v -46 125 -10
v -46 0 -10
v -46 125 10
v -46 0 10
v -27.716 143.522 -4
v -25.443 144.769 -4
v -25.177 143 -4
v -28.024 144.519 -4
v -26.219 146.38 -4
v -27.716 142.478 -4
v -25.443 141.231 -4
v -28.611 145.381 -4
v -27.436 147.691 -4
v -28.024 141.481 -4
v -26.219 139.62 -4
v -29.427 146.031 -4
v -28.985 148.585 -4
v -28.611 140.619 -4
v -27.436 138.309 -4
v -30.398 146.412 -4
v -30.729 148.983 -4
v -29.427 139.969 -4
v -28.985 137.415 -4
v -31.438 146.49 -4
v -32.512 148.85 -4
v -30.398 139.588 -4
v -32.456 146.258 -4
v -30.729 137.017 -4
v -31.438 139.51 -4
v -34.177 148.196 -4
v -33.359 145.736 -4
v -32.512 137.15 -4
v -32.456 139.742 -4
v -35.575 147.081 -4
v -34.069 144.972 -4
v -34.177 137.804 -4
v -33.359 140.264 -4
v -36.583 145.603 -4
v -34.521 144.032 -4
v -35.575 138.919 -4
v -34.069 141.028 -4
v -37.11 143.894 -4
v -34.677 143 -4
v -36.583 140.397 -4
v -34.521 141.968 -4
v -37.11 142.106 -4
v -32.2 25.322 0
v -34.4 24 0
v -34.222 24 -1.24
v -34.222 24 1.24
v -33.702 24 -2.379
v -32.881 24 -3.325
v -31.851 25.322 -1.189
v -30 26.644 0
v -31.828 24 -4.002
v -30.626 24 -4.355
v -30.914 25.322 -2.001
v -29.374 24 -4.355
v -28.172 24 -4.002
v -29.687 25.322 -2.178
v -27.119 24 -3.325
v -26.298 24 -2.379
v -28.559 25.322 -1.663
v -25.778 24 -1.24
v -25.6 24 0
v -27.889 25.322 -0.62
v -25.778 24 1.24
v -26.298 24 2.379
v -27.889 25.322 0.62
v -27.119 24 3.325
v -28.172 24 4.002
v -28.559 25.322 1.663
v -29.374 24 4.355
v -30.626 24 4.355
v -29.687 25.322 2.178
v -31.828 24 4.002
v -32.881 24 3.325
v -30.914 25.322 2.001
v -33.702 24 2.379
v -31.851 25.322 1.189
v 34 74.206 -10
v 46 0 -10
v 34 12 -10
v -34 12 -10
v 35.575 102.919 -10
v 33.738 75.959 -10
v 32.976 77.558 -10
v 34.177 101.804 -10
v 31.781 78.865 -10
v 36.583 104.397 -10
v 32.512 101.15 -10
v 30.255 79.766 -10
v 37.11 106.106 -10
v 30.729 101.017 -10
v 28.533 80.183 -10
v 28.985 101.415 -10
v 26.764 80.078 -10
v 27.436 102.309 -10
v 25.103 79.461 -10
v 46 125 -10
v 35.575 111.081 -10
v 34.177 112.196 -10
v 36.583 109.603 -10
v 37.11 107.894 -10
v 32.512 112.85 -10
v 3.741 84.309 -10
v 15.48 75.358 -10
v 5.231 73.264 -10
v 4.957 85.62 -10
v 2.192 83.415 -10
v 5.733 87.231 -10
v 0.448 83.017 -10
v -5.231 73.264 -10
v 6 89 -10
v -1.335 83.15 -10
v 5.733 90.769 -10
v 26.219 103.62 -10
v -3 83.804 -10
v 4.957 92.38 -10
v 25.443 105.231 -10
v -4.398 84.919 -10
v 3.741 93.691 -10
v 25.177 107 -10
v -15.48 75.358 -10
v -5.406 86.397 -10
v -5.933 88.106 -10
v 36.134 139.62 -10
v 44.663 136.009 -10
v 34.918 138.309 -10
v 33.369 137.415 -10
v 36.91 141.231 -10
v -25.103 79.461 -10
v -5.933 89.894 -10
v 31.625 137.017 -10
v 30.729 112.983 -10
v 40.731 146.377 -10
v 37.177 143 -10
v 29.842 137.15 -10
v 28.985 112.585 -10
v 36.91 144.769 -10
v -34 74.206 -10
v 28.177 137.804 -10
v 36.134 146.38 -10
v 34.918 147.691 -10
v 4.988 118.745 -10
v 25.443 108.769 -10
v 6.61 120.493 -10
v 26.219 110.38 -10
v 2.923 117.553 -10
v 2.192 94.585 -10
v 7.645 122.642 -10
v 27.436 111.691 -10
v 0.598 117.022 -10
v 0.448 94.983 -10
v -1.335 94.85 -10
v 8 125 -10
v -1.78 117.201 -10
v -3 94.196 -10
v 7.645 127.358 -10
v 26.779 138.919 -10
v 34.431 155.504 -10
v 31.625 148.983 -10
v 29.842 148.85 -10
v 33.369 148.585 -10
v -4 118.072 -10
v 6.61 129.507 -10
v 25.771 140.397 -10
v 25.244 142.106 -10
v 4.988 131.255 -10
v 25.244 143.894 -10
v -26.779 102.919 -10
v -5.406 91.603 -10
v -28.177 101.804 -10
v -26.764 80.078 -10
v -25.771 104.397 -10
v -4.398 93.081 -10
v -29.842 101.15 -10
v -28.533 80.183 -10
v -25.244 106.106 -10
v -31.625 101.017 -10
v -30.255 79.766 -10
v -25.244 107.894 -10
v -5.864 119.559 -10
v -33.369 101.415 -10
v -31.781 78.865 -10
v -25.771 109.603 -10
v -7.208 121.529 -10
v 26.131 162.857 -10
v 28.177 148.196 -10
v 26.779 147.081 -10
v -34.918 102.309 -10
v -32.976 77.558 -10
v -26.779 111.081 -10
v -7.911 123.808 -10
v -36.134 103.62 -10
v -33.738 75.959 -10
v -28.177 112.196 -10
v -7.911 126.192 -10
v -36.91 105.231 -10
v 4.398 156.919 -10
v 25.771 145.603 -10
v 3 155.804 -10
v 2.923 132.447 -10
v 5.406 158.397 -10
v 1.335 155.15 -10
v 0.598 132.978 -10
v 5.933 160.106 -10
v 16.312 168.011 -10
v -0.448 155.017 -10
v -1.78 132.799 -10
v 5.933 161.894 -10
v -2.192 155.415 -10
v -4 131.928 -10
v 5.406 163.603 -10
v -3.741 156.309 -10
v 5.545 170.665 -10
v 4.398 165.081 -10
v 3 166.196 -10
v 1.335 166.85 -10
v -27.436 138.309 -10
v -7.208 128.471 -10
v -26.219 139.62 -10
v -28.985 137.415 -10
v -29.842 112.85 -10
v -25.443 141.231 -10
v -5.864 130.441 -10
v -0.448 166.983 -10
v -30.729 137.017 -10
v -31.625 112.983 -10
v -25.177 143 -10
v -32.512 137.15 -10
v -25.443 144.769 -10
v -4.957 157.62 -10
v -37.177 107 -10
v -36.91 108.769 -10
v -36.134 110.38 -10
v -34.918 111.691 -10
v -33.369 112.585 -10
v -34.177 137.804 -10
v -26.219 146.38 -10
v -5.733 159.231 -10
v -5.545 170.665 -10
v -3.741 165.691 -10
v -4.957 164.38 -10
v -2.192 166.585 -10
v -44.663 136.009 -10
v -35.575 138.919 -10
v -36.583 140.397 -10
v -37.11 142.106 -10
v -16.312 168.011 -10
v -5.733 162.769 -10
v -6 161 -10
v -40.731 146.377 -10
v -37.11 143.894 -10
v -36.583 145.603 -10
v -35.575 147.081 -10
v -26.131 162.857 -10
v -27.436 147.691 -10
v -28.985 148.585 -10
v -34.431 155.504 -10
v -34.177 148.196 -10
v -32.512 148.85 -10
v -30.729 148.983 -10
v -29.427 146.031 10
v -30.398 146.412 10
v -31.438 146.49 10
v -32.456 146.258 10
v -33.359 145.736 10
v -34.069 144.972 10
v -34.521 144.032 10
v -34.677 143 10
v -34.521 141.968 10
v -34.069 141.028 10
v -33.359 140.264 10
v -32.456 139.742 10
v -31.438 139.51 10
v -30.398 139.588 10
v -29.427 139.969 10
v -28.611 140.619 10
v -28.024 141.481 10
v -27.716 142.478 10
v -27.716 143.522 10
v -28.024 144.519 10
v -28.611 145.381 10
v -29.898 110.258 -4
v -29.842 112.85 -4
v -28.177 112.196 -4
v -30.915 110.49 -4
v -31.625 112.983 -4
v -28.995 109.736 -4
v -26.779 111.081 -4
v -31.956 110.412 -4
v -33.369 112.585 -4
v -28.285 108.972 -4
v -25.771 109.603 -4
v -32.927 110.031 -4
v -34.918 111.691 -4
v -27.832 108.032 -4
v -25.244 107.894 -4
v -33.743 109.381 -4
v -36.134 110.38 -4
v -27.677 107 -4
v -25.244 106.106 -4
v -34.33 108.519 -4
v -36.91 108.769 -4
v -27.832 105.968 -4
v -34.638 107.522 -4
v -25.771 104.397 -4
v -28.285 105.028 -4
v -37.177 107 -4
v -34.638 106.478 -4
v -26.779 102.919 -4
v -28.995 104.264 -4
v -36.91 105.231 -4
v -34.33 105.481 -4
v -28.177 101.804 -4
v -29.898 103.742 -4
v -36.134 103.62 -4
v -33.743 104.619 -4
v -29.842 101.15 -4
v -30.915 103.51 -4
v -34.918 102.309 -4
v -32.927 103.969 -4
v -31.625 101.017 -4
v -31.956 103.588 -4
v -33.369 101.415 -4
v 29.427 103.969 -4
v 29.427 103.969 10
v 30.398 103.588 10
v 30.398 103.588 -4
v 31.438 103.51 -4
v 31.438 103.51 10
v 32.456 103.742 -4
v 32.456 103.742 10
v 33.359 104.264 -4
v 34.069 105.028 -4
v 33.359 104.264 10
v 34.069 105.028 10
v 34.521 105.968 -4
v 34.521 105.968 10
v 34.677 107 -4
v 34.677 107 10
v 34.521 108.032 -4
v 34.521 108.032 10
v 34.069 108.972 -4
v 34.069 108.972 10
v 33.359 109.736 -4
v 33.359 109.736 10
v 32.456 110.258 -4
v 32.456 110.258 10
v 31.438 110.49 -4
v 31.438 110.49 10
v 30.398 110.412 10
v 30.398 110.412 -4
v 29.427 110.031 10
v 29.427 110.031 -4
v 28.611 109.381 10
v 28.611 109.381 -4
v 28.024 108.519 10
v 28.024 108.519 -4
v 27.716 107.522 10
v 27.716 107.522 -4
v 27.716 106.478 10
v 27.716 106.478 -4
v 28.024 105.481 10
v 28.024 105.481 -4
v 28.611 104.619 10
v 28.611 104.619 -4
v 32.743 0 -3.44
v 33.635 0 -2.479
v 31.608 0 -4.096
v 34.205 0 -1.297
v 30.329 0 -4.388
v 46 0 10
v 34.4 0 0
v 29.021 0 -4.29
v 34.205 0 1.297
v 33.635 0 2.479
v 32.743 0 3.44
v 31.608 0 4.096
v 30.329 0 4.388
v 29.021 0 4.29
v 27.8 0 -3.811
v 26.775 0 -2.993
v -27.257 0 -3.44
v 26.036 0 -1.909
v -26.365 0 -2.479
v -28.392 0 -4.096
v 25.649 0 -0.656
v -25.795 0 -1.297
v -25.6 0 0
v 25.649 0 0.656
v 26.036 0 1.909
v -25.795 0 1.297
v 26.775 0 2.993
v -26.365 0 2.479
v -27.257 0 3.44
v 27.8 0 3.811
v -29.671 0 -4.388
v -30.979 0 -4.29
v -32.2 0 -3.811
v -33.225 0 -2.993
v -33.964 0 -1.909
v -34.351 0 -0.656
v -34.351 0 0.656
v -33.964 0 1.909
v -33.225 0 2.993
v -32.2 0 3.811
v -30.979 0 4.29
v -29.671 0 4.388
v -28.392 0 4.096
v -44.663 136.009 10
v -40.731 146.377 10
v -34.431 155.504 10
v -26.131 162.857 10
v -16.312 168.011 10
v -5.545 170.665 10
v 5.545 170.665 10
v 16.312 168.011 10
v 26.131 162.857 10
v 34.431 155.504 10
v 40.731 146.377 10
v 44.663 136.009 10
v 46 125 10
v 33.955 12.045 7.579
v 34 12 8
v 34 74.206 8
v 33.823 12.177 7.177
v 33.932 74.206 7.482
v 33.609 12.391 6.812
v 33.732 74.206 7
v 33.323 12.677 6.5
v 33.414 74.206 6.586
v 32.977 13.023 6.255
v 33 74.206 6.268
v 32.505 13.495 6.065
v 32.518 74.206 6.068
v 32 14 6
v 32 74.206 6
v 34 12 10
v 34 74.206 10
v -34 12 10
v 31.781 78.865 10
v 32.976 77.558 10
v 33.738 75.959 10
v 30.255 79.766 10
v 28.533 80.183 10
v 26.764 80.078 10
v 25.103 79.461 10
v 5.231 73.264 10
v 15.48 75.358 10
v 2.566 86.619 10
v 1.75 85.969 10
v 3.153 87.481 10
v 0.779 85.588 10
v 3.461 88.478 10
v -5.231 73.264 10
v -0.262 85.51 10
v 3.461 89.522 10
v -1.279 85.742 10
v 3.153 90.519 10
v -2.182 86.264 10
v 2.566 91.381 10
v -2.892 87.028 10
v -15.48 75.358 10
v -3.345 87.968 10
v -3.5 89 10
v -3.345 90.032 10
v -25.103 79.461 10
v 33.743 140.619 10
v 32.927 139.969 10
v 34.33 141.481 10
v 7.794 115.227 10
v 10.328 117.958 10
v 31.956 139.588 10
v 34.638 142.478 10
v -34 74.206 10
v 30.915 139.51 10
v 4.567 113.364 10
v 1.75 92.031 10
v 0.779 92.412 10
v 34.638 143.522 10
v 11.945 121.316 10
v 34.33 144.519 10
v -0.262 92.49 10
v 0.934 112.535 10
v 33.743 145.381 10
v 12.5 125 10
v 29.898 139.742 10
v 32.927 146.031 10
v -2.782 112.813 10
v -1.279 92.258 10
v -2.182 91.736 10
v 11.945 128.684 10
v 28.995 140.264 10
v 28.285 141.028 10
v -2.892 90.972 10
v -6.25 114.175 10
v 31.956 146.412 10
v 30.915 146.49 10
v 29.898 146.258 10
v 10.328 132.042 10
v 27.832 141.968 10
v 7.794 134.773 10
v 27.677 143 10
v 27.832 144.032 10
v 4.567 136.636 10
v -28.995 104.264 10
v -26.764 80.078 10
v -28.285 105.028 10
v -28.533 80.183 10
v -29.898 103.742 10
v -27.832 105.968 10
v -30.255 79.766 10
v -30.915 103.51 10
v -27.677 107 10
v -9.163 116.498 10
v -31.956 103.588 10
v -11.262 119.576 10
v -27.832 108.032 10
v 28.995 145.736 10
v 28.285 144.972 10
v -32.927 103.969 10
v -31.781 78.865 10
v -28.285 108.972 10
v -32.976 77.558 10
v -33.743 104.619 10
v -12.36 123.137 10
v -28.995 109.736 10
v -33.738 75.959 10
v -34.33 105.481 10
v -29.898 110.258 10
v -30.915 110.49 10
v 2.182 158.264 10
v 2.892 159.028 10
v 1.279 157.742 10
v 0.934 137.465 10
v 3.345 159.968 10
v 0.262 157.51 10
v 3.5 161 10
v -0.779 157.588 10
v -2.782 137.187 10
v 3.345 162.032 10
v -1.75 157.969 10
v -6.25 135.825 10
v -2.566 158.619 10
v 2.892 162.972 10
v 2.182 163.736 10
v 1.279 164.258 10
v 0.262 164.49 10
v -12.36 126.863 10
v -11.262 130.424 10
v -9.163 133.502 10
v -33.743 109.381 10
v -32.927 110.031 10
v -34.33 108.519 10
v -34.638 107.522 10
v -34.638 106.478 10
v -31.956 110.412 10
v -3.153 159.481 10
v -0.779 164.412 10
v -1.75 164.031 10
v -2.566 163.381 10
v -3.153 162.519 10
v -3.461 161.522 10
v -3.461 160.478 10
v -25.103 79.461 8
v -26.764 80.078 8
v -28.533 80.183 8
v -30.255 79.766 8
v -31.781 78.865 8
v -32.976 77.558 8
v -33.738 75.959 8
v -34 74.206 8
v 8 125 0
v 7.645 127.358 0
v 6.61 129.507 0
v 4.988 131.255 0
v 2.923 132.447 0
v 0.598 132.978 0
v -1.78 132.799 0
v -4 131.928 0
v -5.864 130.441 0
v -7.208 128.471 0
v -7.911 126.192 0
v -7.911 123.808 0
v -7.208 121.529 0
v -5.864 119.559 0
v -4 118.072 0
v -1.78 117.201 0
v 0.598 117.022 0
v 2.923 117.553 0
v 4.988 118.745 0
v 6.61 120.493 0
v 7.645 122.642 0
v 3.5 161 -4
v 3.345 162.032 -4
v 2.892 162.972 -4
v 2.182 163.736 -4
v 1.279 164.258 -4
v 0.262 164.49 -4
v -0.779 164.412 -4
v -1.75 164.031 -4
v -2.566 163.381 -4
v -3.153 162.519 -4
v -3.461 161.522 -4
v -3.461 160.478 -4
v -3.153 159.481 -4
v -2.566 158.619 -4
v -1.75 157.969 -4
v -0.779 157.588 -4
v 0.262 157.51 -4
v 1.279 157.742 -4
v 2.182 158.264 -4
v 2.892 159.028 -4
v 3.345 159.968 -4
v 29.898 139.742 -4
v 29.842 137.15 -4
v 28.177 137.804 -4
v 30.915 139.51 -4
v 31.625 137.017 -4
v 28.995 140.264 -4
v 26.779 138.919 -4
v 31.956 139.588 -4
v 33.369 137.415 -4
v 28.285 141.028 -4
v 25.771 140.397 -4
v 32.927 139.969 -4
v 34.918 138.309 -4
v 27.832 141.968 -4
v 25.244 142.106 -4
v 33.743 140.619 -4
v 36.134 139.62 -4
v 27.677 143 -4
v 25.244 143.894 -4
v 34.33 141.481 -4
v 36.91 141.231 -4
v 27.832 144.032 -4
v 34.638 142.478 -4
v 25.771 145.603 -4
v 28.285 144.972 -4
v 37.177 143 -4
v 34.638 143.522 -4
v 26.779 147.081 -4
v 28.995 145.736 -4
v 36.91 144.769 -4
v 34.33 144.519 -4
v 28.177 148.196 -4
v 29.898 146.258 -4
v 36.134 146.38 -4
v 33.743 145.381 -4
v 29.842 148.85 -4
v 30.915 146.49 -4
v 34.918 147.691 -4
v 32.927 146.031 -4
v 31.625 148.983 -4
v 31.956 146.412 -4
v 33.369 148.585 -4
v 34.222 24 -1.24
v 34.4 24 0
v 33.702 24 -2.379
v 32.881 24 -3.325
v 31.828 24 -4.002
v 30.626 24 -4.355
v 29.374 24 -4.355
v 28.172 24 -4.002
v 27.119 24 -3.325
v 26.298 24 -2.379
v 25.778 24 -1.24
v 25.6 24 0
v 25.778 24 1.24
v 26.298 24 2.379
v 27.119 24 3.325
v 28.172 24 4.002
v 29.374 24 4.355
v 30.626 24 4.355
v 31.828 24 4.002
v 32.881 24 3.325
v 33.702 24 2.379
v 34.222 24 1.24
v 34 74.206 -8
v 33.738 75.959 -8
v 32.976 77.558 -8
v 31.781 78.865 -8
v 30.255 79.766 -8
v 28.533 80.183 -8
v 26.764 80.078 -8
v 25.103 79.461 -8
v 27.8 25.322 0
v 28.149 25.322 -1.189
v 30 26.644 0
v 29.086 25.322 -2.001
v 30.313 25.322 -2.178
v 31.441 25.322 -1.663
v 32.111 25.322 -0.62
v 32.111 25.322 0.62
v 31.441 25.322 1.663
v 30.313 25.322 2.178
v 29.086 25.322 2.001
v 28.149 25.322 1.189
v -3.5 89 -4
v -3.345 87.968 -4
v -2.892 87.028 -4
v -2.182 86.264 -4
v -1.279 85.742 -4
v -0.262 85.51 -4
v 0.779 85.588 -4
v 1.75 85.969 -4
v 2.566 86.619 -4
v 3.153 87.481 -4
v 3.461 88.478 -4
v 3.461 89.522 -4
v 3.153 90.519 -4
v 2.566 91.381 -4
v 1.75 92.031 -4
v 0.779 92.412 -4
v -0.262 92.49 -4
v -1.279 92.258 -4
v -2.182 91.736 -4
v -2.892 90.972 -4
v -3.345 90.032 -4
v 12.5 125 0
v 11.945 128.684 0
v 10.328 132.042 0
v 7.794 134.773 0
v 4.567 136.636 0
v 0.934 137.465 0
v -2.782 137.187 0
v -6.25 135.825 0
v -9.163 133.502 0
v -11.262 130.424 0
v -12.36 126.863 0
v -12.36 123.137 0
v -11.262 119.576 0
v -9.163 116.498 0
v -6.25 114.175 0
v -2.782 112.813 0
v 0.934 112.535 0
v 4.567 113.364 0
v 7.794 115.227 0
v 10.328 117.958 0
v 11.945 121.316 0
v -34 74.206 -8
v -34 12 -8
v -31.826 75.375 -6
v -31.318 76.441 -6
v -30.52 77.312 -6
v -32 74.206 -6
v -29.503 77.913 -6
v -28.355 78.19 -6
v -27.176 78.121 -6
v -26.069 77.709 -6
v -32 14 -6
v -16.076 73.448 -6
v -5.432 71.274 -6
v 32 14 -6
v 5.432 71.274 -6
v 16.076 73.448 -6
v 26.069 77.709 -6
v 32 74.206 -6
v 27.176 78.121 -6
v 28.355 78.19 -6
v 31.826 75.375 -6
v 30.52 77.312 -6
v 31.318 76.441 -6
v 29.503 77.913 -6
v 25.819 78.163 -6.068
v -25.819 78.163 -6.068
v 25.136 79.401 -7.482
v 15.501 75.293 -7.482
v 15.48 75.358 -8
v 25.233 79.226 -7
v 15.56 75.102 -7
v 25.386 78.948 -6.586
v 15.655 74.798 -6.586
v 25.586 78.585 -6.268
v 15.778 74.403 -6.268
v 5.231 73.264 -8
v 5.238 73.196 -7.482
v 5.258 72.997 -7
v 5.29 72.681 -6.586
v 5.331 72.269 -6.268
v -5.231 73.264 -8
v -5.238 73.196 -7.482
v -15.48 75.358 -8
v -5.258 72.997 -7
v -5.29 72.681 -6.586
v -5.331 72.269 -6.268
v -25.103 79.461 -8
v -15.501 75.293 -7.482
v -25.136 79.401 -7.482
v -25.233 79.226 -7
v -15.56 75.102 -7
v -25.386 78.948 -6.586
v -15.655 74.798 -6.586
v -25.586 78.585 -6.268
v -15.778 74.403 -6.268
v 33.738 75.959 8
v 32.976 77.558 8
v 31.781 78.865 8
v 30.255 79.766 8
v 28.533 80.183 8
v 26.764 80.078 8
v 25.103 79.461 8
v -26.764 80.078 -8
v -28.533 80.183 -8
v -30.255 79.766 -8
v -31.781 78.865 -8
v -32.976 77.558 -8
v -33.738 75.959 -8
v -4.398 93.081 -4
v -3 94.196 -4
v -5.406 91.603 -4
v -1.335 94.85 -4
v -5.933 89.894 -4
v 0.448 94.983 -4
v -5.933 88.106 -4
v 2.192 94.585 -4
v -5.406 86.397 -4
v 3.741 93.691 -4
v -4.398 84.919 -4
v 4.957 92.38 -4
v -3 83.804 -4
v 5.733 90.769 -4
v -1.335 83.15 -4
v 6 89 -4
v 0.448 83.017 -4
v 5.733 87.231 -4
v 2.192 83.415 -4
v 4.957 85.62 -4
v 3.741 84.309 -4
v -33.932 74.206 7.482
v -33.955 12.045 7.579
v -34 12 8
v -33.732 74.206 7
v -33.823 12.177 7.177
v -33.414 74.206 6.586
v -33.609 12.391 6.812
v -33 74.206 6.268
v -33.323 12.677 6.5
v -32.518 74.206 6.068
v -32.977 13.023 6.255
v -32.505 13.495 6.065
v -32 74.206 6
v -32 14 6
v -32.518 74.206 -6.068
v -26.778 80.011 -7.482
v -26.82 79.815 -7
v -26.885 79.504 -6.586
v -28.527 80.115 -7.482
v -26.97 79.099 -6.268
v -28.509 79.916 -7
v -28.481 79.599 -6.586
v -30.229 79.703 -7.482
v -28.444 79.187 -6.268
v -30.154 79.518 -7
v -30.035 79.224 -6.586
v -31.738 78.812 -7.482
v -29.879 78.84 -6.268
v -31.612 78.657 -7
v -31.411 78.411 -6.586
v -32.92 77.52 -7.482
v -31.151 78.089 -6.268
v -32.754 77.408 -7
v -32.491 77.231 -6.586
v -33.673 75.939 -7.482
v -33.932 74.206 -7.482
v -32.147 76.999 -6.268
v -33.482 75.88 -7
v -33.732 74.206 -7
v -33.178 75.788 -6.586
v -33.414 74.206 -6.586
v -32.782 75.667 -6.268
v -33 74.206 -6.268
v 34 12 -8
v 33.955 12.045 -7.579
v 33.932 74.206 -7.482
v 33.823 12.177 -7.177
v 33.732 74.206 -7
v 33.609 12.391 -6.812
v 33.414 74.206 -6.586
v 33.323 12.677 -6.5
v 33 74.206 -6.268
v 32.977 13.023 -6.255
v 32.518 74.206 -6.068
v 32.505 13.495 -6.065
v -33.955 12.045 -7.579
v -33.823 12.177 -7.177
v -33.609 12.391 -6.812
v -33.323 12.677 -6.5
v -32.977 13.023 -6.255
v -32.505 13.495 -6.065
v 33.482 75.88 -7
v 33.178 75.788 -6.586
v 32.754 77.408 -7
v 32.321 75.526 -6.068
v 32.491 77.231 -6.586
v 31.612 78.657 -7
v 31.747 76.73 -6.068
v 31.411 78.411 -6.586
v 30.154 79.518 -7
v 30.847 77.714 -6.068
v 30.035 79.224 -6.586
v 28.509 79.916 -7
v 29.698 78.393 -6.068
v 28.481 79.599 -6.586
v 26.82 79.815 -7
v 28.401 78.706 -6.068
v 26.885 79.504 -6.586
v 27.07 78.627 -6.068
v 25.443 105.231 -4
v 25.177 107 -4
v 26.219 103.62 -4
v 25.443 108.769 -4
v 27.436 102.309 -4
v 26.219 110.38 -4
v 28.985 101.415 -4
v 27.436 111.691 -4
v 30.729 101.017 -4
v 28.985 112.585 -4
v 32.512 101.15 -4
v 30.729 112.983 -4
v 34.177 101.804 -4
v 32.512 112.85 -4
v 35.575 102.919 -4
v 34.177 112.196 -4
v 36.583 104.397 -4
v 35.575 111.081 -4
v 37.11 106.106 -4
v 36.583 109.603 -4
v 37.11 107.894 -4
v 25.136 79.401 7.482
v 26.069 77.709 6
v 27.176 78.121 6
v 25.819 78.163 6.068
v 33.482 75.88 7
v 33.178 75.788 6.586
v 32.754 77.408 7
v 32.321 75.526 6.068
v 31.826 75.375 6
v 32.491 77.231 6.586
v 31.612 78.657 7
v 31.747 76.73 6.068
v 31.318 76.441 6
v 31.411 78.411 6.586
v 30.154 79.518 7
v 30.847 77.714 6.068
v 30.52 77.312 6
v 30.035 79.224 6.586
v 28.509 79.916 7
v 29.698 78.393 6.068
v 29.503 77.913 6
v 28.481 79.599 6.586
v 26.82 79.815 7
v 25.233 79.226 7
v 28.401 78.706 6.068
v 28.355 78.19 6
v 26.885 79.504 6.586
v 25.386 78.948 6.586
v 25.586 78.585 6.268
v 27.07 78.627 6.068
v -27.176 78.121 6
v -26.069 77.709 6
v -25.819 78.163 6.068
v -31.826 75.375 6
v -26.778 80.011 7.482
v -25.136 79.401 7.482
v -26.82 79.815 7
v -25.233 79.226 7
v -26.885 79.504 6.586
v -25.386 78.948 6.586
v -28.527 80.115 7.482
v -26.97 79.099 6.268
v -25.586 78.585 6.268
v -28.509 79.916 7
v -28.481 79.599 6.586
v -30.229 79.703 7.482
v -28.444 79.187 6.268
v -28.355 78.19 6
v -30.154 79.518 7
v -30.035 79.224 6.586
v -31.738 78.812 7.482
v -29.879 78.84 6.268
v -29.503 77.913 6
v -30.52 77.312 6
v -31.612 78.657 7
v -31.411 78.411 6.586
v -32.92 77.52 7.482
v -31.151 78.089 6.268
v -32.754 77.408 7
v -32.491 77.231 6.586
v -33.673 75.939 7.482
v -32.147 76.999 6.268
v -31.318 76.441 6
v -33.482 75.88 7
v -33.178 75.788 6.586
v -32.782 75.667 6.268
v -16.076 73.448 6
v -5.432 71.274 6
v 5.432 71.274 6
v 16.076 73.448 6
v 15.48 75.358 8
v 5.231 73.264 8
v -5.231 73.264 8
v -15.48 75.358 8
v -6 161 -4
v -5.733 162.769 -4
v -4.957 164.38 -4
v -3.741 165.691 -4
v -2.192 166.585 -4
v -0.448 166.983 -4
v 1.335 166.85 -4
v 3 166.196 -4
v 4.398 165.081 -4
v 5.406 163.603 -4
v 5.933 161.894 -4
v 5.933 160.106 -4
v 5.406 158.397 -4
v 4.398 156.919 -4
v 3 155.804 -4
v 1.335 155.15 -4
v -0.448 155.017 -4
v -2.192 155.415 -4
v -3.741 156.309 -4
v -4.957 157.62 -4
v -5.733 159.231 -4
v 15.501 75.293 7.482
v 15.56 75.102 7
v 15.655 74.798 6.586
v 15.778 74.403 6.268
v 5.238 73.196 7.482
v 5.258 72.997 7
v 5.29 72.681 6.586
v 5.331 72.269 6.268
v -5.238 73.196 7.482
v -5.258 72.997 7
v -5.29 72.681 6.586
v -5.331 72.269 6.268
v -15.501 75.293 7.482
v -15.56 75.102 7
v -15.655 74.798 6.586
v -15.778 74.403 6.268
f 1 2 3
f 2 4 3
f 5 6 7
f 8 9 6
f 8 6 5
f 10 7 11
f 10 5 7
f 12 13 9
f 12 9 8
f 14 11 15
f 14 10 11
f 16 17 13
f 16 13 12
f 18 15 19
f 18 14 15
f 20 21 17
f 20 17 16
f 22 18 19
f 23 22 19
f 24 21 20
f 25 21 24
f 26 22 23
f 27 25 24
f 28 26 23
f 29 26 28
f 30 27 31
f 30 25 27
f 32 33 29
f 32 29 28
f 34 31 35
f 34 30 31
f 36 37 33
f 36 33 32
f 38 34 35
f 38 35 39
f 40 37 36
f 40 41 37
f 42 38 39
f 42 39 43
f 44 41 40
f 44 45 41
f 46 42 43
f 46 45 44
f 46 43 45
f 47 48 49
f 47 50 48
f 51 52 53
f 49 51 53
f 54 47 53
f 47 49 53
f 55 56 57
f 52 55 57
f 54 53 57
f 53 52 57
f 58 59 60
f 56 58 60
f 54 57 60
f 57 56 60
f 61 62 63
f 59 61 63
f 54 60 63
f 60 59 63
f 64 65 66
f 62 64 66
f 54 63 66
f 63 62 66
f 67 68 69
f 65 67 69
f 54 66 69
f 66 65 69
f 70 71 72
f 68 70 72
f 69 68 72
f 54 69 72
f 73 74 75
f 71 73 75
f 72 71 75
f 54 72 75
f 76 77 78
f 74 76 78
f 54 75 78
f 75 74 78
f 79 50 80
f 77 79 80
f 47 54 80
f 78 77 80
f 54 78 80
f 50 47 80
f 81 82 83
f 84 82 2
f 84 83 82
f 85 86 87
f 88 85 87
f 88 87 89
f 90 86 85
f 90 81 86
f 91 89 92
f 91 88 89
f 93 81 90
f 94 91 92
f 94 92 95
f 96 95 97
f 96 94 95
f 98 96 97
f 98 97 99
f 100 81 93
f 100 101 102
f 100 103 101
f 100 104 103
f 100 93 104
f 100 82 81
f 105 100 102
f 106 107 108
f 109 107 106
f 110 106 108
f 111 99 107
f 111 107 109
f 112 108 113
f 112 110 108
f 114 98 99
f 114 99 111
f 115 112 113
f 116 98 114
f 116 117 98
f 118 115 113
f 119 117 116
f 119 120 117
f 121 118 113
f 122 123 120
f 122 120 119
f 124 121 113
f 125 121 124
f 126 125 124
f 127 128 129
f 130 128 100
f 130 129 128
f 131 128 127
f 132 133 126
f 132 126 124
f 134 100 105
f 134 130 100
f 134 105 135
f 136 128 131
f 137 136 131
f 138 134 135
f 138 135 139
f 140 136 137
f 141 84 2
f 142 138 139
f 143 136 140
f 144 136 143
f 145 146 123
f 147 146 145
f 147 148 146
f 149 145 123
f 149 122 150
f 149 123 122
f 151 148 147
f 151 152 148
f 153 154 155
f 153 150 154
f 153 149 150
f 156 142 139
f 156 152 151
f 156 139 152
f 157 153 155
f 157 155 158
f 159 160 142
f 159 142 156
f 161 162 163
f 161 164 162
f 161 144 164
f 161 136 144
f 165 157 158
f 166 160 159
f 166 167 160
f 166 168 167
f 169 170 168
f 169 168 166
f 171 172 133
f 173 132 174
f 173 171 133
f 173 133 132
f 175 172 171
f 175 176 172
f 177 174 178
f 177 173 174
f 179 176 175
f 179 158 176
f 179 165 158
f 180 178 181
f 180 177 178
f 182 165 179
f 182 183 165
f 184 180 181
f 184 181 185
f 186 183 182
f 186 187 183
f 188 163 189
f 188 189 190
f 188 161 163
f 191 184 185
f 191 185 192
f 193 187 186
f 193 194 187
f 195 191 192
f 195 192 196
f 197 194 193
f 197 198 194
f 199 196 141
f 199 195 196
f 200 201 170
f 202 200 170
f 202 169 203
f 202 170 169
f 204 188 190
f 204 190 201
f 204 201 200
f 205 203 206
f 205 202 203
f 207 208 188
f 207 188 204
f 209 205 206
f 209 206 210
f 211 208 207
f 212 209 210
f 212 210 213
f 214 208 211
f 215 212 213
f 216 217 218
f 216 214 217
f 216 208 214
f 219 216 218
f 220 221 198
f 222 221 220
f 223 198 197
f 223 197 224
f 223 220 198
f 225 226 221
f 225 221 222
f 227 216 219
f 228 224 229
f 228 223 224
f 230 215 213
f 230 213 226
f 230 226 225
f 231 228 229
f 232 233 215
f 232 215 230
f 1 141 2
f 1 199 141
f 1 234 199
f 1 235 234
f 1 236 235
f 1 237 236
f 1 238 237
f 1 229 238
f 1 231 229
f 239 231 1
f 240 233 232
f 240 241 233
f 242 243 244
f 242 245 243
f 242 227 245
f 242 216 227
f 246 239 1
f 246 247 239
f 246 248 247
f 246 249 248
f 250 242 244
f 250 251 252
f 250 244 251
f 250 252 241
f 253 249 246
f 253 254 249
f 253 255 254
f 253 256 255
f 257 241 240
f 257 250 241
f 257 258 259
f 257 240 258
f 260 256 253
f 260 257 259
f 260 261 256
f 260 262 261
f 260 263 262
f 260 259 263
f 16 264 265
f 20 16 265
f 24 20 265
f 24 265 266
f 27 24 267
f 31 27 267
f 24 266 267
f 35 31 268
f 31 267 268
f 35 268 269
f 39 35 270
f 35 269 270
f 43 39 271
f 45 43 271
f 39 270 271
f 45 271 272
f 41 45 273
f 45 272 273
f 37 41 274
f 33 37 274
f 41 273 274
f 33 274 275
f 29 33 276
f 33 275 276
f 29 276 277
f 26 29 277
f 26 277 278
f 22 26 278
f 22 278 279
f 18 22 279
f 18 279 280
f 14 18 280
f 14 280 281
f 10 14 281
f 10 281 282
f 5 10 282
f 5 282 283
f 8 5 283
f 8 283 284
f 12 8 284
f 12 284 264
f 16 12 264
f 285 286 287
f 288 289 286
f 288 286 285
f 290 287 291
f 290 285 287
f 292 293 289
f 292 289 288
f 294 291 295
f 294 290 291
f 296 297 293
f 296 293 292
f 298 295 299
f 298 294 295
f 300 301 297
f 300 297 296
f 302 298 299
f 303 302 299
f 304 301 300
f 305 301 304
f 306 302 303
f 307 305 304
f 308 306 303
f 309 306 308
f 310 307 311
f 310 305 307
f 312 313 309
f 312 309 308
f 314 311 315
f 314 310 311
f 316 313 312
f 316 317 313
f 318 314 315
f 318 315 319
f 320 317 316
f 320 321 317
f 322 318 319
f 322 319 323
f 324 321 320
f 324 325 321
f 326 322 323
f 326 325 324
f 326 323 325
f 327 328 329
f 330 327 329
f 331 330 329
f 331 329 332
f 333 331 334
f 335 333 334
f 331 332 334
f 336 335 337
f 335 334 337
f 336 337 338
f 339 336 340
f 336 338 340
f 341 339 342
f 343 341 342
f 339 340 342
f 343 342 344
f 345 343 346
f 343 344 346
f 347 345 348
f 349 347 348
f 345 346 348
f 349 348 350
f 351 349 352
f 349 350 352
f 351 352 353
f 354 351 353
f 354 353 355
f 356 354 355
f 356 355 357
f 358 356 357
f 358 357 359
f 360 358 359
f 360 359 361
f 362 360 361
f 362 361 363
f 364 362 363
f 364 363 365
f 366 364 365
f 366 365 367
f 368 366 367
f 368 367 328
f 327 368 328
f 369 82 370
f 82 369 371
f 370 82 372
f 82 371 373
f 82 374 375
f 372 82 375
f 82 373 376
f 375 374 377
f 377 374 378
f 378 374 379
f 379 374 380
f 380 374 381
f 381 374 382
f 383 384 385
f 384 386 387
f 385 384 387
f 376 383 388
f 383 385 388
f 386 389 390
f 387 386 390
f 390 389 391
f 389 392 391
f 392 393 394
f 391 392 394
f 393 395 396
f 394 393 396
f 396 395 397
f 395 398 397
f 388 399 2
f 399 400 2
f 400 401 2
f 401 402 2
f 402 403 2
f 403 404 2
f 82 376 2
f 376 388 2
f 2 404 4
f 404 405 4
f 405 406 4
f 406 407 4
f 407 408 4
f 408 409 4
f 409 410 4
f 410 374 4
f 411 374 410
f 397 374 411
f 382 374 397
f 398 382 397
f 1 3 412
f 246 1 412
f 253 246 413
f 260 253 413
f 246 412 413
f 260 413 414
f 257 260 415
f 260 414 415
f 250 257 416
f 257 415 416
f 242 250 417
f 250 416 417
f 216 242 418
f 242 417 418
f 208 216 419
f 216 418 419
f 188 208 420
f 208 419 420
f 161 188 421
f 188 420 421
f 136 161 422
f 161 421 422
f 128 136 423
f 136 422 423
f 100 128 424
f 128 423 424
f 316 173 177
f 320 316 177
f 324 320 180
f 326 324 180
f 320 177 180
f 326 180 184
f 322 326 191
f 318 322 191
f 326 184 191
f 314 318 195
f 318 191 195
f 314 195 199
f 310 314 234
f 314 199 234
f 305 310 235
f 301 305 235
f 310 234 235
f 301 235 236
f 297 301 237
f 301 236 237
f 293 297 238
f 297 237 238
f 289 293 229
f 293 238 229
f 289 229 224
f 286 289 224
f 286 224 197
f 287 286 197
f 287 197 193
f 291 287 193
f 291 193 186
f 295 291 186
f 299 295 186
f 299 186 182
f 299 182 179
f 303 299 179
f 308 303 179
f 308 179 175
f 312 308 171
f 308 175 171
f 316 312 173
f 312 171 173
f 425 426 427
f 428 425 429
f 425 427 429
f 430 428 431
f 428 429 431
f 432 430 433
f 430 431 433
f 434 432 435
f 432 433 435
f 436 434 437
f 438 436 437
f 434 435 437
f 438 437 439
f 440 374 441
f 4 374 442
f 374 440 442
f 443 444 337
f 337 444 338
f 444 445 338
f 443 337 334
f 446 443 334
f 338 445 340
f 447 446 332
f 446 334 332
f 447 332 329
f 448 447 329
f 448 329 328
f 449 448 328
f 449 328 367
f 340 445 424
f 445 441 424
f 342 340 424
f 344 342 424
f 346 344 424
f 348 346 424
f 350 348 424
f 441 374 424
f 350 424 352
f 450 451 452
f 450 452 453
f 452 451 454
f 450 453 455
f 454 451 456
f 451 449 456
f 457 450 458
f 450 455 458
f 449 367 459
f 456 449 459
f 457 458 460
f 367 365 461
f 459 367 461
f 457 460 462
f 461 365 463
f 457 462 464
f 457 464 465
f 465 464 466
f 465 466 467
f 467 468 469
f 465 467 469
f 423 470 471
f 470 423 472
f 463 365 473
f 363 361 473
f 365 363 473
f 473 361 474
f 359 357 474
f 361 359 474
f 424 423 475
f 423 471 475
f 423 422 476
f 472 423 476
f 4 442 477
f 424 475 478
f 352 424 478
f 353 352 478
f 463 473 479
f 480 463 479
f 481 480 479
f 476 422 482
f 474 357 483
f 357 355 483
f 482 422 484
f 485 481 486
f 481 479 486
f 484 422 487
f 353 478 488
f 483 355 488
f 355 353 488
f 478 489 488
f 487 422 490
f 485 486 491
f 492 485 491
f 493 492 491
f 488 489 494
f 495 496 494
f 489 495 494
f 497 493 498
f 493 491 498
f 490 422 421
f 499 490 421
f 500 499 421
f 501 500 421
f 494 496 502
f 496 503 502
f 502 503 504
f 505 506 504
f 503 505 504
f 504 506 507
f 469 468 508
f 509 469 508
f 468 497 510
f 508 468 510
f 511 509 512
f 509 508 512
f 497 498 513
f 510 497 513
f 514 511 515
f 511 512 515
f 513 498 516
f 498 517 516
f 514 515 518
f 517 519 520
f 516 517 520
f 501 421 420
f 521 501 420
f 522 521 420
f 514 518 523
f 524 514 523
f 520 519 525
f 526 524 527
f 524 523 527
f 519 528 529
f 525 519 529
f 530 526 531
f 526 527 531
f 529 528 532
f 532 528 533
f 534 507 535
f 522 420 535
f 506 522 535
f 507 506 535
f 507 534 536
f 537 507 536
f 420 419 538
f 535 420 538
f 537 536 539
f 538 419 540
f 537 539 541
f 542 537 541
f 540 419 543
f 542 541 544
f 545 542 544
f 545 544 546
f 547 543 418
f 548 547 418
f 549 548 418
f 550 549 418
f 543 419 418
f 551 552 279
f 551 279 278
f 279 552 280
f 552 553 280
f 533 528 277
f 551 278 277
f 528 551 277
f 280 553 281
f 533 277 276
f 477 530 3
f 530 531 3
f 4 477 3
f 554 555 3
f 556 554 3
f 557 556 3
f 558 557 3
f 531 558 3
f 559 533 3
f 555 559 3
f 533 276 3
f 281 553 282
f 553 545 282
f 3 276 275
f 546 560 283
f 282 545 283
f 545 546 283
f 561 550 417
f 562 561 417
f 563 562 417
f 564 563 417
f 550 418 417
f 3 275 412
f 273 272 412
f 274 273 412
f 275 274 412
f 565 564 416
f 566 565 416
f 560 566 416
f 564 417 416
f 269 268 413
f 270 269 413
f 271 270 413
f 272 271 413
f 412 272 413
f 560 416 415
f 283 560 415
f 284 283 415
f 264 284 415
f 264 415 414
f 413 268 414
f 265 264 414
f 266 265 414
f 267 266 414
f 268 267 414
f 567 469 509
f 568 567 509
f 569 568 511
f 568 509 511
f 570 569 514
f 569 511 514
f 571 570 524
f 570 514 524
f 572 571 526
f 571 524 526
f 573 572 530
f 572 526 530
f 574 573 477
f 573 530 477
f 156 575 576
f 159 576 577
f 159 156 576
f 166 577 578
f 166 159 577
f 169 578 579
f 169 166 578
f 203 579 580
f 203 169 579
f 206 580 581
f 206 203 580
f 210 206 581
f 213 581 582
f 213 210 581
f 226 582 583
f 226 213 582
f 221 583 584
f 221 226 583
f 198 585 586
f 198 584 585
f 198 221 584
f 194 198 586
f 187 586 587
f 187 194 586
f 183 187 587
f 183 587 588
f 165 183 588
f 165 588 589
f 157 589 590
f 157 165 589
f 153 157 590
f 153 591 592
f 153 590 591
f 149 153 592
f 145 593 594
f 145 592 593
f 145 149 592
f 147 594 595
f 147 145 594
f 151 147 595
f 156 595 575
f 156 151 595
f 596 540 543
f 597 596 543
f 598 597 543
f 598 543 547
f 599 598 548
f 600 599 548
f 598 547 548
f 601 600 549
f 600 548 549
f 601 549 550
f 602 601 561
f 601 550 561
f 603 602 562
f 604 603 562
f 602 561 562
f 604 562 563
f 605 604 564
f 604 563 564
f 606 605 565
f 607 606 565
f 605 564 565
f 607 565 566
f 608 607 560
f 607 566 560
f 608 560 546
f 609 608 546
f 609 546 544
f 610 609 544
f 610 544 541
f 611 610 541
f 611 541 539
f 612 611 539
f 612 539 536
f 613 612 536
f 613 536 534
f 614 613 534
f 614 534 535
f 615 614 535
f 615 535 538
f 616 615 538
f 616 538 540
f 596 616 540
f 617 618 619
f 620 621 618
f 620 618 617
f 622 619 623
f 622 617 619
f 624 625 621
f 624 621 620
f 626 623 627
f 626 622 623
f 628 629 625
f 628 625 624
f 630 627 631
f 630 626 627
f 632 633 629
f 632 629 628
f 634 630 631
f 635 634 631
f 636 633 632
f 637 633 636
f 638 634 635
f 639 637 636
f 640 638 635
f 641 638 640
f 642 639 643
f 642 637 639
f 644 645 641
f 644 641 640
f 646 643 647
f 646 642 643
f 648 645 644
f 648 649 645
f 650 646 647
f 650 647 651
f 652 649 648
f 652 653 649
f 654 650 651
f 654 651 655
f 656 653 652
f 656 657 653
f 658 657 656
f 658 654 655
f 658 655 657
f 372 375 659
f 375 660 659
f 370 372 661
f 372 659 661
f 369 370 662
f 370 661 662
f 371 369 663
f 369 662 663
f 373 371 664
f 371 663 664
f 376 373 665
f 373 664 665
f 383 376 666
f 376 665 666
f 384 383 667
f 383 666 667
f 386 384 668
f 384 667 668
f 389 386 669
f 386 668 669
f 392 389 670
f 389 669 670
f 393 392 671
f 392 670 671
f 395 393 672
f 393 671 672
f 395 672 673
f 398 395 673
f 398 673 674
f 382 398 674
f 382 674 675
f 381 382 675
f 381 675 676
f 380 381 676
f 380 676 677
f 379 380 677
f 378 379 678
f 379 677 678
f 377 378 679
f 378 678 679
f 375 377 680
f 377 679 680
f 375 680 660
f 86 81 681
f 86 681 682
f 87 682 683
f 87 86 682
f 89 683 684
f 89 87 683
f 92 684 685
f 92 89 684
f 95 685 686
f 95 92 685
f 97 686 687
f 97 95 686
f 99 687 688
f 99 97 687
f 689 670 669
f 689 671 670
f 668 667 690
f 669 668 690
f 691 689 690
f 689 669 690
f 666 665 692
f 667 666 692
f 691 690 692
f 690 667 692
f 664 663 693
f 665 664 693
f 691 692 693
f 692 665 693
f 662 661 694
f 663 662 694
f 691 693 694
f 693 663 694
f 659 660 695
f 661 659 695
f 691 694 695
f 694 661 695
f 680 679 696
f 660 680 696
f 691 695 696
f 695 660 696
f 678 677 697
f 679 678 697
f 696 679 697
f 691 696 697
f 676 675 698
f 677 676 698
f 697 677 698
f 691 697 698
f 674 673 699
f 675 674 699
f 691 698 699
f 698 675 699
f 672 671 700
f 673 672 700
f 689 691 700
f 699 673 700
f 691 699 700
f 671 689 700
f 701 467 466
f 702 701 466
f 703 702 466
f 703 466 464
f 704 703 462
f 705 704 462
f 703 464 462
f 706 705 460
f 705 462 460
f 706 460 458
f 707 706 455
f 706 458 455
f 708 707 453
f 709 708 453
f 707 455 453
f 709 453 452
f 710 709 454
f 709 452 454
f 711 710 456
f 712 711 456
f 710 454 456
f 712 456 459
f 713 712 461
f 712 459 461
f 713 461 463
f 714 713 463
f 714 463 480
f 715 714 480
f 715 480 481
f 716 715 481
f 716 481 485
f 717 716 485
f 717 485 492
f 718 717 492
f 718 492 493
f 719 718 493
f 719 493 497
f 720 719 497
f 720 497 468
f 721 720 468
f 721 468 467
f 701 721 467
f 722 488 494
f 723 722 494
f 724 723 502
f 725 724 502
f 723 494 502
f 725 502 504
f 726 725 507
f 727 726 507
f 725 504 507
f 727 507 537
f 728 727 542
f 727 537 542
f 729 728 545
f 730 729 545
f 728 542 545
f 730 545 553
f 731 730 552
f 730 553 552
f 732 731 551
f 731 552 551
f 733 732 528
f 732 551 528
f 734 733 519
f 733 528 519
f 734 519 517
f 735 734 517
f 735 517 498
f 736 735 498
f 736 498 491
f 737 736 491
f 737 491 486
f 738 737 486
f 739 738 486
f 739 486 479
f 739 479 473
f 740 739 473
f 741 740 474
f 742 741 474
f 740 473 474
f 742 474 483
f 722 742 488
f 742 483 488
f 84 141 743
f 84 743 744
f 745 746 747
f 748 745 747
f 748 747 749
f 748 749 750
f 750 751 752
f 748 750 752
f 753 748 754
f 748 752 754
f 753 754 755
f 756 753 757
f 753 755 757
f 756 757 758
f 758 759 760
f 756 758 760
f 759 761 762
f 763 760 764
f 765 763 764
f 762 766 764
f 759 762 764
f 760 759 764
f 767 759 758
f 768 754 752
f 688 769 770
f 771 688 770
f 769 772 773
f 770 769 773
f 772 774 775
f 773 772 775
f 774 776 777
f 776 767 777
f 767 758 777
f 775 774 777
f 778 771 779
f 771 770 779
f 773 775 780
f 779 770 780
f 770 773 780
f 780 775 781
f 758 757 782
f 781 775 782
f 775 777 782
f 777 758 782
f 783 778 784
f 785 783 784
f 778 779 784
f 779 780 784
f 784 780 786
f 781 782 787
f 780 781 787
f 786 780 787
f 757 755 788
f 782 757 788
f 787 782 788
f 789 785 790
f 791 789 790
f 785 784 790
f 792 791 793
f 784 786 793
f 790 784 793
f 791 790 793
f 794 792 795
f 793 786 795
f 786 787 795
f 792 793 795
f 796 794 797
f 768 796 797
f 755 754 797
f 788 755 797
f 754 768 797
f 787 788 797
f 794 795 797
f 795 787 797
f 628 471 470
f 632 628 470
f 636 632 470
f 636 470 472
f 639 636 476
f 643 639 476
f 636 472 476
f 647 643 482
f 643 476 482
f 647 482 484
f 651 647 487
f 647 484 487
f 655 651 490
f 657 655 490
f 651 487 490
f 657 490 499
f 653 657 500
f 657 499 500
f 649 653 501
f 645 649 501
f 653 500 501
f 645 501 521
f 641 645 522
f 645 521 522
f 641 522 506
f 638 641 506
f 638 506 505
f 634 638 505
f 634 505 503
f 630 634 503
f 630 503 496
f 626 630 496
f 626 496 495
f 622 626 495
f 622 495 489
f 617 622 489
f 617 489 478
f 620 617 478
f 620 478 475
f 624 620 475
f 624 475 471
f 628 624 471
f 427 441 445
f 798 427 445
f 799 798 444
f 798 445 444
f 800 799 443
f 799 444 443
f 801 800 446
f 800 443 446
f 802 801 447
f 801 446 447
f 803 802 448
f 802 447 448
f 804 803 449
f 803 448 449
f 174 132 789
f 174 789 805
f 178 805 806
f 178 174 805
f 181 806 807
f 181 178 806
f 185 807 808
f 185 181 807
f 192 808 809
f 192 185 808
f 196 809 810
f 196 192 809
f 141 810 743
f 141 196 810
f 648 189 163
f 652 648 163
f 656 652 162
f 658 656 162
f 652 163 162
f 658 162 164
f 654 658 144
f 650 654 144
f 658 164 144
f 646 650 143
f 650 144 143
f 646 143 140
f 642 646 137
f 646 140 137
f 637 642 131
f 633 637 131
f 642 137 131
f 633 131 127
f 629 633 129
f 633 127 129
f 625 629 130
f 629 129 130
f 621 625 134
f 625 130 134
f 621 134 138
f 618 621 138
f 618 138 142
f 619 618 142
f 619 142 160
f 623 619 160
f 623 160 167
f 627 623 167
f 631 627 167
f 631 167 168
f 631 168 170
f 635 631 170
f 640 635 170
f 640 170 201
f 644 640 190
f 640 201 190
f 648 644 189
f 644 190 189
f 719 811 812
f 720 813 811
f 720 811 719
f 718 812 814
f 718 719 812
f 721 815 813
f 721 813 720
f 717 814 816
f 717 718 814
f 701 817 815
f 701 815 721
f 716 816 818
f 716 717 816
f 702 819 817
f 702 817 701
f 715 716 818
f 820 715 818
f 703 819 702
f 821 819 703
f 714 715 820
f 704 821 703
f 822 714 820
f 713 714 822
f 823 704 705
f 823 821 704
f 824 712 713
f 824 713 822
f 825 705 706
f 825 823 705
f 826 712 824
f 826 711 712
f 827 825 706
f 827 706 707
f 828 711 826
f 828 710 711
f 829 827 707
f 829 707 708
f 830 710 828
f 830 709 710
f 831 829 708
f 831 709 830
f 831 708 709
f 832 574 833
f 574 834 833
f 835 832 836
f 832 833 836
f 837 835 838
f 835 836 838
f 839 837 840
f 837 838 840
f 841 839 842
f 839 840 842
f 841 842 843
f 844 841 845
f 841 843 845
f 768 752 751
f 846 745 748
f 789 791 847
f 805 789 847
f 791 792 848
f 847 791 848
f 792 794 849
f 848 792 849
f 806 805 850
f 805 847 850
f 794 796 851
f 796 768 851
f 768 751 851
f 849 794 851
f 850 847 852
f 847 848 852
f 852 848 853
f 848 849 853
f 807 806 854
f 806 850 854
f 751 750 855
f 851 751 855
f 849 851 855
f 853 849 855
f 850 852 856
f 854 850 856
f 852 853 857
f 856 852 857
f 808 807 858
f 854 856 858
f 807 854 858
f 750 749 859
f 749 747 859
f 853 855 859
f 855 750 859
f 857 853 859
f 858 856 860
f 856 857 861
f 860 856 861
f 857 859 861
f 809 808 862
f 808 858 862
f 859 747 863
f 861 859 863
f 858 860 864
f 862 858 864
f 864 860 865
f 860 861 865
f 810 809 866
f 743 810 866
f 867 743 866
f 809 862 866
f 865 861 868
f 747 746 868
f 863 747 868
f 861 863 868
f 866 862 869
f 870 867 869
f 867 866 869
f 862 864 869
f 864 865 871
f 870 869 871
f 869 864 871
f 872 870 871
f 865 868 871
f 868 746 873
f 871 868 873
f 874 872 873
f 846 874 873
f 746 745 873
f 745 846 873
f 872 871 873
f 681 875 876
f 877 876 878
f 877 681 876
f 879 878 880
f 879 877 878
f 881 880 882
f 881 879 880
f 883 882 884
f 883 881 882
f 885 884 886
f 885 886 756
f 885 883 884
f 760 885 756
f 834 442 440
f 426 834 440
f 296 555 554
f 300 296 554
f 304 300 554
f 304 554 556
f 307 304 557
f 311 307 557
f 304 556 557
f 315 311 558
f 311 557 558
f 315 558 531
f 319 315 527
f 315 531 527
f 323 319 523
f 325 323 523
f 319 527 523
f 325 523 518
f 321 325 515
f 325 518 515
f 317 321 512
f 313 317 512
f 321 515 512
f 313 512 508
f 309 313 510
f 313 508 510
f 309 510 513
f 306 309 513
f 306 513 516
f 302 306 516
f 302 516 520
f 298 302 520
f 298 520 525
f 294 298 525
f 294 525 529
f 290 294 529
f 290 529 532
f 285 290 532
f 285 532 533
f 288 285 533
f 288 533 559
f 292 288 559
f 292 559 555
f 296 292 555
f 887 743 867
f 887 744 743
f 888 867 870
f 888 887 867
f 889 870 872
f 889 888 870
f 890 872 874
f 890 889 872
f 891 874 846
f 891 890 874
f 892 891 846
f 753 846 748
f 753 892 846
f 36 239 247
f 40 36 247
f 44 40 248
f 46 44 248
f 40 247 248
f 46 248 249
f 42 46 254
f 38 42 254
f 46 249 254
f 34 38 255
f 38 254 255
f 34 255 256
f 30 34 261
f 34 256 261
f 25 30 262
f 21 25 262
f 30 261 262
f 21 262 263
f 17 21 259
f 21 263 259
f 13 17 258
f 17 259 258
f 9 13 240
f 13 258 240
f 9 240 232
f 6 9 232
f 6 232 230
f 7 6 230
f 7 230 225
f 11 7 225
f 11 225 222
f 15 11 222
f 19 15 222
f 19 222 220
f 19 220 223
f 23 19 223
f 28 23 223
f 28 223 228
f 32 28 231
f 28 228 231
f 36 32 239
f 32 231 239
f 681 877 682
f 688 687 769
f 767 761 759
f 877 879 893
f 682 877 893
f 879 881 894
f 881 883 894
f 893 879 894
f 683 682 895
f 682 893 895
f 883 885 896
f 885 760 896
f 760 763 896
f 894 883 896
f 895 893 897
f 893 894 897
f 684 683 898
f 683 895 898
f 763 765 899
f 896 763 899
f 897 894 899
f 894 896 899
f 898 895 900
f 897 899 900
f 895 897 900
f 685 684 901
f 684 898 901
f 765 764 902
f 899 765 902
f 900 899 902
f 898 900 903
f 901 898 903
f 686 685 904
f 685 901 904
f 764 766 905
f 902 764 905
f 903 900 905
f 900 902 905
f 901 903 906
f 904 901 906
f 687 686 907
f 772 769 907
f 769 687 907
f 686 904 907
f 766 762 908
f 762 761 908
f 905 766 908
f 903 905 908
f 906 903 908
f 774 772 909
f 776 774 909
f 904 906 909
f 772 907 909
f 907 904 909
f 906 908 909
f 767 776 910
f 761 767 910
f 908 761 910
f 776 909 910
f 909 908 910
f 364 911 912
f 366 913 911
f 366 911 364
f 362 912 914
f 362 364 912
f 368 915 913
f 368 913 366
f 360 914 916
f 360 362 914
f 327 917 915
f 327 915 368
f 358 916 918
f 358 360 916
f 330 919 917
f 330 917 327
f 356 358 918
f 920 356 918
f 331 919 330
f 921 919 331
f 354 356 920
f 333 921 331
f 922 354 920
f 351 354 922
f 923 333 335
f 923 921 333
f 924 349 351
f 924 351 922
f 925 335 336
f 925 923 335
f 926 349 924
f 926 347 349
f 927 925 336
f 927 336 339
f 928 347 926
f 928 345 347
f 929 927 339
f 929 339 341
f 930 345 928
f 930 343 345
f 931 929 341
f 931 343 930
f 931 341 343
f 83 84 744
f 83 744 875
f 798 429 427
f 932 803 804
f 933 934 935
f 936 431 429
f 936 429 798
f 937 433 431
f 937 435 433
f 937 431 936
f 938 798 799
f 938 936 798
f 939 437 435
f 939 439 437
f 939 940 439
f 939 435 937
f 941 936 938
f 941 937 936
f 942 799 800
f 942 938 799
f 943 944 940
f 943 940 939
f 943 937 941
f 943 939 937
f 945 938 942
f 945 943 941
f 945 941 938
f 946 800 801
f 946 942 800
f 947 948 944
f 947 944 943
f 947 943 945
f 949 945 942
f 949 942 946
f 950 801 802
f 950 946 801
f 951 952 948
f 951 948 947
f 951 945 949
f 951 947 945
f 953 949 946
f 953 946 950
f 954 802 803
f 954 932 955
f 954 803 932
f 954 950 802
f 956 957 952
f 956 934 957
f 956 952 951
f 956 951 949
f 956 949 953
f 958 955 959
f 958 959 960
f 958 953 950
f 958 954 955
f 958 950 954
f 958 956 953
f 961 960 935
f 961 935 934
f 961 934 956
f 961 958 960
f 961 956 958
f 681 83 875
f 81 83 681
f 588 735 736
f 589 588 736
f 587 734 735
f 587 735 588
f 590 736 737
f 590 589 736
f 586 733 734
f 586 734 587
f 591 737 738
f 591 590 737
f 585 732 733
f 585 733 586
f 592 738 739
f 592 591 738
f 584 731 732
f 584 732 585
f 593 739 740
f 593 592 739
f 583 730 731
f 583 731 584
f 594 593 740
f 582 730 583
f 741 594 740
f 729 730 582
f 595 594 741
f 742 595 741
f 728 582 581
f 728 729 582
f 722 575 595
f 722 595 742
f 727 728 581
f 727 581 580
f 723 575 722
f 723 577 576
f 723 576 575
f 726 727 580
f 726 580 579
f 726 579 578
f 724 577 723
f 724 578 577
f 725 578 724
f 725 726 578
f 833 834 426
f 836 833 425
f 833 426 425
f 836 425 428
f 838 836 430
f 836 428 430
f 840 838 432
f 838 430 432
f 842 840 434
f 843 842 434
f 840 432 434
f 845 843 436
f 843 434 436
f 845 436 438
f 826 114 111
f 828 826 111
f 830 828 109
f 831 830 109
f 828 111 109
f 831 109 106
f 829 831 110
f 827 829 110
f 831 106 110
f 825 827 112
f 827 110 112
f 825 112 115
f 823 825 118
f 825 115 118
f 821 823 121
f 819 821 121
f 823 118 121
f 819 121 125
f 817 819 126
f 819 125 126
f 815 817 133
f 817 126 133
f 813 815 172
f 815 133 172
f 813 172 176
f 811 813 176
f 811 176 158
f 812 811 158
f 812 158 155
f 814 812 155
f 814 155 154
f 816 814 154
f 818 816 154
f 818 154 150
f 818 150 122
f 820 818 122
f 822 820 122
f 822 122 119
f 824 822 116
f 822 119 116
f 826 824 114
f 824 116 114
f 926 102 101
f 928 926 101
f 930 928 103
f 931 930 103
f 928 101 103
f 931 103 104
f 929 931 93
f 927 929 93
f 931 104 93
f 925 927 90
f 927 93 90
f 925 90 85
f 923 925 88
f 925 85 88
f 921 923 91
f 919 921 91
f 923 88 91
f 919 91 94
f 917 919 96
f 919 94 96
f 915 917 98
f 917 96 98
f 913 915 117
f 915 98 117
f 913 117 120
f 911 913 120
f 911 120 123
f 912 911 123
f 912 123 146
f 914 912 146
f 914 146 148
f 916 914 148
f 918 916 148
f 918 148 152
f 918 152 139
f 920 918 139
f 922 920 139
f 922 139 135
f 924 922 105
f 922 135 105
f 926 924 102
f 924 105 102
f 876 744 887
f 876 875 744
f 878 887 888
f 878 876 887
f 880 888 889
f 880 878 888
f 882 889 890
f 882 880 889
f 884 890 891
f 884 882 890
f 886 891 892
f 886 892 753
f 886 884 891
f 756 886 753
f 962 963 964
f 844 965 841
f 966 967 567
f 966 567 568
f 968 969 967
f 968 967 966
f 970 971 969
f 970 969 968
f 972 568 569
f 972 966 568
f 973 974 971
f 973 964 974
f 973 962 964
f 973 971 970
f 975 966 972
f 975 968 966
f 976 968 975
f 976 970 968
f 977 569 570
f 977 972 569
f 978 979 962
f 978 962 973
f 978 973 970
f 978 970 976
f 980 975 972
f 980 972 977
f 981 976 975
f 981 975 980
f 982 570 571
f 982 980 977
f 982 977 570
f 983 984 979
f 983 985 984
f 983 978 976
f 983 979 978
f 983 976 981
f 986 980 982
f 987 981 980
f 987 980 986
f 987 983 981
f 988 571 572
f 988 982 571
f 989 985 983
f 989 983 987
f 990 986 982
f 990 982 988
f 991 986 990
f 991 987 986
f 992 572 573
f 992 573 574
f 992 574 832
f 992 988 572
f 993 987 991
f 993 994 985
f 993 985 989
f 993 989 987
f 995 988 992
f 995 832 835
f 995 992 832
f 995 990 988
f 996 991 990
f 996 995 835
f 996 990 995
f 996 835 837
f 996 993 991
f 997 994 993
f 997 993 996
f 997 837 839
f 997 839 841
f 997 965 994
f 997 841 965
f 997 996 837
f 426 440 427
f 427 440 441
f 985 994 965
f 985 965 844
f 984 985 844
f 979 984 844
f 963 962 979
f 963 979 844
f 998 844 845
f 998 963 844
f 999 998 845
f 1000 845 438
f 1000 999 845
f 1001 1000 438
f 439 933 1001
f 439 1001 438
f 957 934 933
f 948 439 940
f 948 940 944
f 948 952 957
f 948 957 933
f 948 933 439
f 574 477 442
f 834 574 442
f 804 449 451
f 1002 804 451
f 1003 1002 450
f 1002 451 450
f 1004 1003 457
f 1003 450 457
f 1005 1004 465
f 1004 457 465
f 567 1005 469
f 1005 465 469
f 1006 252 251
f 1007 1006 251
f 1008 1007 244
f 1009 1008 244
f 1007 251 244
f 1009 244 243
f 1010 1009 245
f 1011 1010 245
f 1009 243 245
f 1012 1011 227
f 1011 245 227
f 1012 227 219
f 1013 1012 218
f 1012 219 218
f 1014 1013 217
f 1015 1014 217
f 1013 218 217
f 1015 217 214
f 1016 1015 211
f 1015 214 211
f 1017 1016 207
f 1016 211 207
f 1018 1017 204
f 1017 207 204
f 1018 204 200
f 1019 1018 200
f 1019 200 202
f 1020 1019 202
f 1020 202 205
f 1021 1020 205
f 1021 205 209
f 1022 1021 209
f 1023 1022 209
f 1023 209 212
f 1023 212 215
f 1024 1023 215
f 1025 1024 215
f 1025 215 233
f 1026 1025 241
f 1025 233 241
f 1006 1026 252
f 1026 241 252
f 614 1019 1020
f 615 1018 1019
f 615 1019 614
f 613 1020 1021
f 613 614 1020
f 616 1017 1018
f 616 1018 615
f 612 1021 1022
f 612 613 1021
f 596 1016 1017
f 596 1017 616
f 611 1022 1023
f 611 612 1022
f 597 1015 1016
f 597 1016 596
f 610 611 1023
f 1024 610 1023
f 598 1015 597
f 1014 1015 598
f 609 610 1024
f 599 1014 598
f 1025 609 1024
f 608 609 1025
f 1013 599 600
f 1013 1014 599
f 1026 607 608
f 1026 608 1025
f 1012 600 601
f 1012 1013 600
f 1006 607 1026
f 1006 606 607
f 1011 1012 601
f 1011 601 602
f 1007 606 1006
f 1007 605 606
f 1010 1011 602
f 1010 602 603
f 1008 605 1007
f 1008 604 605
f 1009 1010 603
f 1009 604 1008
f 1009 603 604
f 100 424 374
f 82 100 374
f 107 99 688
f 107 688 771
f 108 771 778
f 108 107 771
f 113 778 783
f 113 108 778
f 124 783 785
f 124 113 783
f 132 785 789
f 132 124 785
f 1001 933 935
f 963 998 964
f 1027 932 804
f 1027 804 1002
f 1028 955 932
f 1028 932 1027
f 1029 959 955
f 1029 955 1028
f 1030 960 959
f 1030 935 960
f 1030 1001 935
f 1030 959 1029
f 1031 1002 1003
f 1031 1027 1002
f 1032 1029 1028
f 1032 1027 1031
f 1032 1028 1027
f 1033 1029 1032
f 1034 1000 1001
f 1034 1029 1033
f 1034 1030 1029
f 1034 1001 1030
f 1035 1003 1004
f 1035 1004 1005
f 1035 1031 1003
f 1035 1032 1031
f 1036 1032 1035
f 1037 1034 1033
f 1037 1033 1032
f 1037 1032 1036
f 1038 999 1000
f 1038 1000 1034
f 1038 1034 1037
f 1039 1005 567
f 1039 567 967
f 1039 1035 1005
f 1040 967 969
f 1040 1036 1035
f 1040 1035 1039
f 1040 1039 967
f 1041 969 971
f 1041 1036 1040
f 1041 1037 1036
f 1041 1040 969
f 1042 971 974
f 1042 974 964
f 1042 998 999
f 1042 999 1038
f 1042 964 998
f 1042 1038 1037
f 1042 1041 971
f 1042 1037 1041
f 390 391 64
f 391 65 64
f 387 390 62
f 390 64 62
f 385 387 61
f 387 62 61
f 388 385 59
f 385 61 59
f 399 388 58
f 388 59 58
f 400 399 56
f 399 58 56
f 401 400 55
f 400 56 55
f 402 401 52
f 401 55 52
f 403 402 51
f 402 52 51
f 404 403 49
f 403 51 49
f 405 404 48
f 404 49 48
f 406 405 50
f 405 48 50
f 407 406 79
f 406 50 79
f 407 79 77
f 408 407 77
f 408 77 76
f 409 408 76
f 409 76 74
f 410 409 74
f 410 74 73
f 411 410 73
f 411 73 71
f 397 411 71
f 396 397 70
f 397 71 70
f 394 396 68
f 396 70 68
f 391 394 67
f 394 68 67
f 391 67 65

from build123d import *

# Parameters (mm, degrees)
SKETCH1_R                         = 8
BOSS_EXTRUDE1_DEPTH               = 10
SKETCH2_R                         = 12.5
CUT_EXTRUDE1_DEPTH                = 10
SKETCH3_R                         = 3.5
CUT_EXTRUDE2_DEPTH                = 21
SKETCH4_R                         = 6
CUT_EXTRUDE3_DEPTH                = 6
CIRPATTERN1_COUNT                 = 6
TAP_DRILL_FOR_M10X1_25_TAP2_D     = 8.8
TAP_DRILL_FOR_M10X1_25_TAP2_DEPTH = 24
TAP_DRILL_FOR_M10X1_25_TAP2_TIP   = 2.643786724
CUT_EXTRUDE4_DEPTH                = 4
FILLET1_R                         = 2
FILLET1_OF_MIRROR1_R              = 2


with BuildPart() as part:
    # Sketch1 → Boss-Extrude1 (new body, symmetric)
    with BuildSketch(Plane.XY):
        with BuildLine():
            Line((46, 125), (46, 0))
            Line((46, 0), (-46, 0))
            Line((-46, 0), (-46, 125))
            ThreePointArc((-46, 125), (0, 171), (46, 125))
        make_face()
        with Locations((0, 125)):
            Circle(SKETCH1_R, mode=Mode.SUBTRACT)
    extrude(amount=BOSS_EXTRUDE1_DEPTH, both=True)

    # Sketch2 → Cut-Extrude1 (cut)
    with BuildSketch(Plane.XY.offset(10)):
        with Locations((0, 125)):
            Circle(SKETCH2_R)
    extrude(amount=-CUT_EXTRUDE1_DEPTH, mode=Mode.SUBTRACT)

    # Sketch3 → Cut-Extrude2 (cut, through all)
    with BuildSketch(Plane.XY.offset(10)):
        with Locations((0, 161)):
            Circle(SKETCH3_R)
    cut_extrude2 = extrude(amount=-CUT_EXTRUDE2_DEPTH, mode=Mode.SUBTRACT)

    # Sketch4 → Cut-Extrude3 (cut)
    with BuildSketch(Plane(origin=(0, 0, -10), x_dir=(-1, 0, 0), z_dir=(0, 0, -1))):
        with Locations((0, 161)):
            Circle(SKETCH4_R)
    cut_extrude3 = extrude(amount=-CUT_EXTRUDE3_DEPTH, mode=Mode.SUBTRACT)

    # CirPattern1: Cut-Extrude2, Cut-Extrude3 ×6 about axis
    cirpattern1_axis = Axis((0, 125, 0), (0, 0, 1))
    for i in range(1, CIRPATTERN1_COUNT):
        add(cut_extrude2.rotate(cirpattern1_axis, i * 360 / CIRPATTERN1_COUNT), mode=Mode.SUBTRACT)
        add(cut_extrude3.rotate(cirpattern1_axis, i * 360 / CIRPATTERN1_COUNT), mode=Mode.SUBTRACT)

    # Tap Drill for M10x1.25 Tap2
    with Locations(Plane(origin=(0, 0, 0), x_dir=(-1, 0, 0), z_dir=(0, -1, 0))):
        with Locations((30, 0), (-30, 0)):
            Hole(TAP_DRILL_FOR_M10X1_25_TAP2_D / 2, depth=TAP_DRILL_FOR_M10X1_25_TAP2_DEPTH)
            with Locations((0, 0, -(TAP_DRILL_FOR_M10X1_25_TAP2_DEPTH + TAP_DRILL_FOR_M10X1_25_TAP2_TIP / 2))):  # 118° drill point
                Cone(0, TAP_DRILL_FOR_M10X1_25_TAP2_D / 2, TAP_DRILL_FOR_M10X1_25_TAP2_TIP, mode=Mode.SUBTRACT)

    # Sketch11 → Cut-Extrude4 (cut)
    with BuildSketch(Plane.XY.offset(10)):
        with BuildLine():
            Line((-34, 74.206299603), (-34, 12))
            Line((-34, 12), (34, 12))
            Line((34, 12), (34, 74.206299603))
            ThreePointArc((34, 74.206299603), (31.051285766, 79.372502771), (25.103448276, 79.460820334))
            ThreePointArc((25.103448276, 79.460820334), (0, 73), (-25.103448276, 79.460820334))
            ThreePointArc((-25.103448276, 79.460820334), (-31.051285766, 79.372502771), (-34, 74.206299603))
        make_face()
    cut_extrude4 = extrude(amount=-CUT_EXTRUDE4_DEPTH, mode=Mode.SUBTRACT)

    # Fillet1
    fillet1_edges = [part.edges().sort_by_distance(p)[0] for p in [
        (31.051285766, 79.372502771, 6),
        (34, 43.103149802, 6),
        (0, 12, 6),
        (-34, 43.103149802, 6),
        (-31.051285766, 79.372502771, 6),
        (0, 73, 6),
    ]]
    fillet(fillet1_edges, radius=FILLET1_R)

    # Mirror1: Cut-Extrude4 across plane
    add(cut_extrude4.mirror(Plane.XY), mode=Mode.SUBTRACT)

    # Fillet1 of Mirror1
    fillet1_of_mirror1_edges = [part.edges().sort_by_distance(p)[0] for p in [
        (31.051285766, 79.372502771, -6),
        (34, 43.103149802, -6),
        (0, 12, -6),
        (-34, 43.103149802, -6),
        (-31.051285766, 79.372502771, -6),
        (0, 73, -6),
    ]]
    fillet(fillet1_of_mirror1_edges, radius=FILLET1_OF_MIRROR1_R)


solid = part.part
